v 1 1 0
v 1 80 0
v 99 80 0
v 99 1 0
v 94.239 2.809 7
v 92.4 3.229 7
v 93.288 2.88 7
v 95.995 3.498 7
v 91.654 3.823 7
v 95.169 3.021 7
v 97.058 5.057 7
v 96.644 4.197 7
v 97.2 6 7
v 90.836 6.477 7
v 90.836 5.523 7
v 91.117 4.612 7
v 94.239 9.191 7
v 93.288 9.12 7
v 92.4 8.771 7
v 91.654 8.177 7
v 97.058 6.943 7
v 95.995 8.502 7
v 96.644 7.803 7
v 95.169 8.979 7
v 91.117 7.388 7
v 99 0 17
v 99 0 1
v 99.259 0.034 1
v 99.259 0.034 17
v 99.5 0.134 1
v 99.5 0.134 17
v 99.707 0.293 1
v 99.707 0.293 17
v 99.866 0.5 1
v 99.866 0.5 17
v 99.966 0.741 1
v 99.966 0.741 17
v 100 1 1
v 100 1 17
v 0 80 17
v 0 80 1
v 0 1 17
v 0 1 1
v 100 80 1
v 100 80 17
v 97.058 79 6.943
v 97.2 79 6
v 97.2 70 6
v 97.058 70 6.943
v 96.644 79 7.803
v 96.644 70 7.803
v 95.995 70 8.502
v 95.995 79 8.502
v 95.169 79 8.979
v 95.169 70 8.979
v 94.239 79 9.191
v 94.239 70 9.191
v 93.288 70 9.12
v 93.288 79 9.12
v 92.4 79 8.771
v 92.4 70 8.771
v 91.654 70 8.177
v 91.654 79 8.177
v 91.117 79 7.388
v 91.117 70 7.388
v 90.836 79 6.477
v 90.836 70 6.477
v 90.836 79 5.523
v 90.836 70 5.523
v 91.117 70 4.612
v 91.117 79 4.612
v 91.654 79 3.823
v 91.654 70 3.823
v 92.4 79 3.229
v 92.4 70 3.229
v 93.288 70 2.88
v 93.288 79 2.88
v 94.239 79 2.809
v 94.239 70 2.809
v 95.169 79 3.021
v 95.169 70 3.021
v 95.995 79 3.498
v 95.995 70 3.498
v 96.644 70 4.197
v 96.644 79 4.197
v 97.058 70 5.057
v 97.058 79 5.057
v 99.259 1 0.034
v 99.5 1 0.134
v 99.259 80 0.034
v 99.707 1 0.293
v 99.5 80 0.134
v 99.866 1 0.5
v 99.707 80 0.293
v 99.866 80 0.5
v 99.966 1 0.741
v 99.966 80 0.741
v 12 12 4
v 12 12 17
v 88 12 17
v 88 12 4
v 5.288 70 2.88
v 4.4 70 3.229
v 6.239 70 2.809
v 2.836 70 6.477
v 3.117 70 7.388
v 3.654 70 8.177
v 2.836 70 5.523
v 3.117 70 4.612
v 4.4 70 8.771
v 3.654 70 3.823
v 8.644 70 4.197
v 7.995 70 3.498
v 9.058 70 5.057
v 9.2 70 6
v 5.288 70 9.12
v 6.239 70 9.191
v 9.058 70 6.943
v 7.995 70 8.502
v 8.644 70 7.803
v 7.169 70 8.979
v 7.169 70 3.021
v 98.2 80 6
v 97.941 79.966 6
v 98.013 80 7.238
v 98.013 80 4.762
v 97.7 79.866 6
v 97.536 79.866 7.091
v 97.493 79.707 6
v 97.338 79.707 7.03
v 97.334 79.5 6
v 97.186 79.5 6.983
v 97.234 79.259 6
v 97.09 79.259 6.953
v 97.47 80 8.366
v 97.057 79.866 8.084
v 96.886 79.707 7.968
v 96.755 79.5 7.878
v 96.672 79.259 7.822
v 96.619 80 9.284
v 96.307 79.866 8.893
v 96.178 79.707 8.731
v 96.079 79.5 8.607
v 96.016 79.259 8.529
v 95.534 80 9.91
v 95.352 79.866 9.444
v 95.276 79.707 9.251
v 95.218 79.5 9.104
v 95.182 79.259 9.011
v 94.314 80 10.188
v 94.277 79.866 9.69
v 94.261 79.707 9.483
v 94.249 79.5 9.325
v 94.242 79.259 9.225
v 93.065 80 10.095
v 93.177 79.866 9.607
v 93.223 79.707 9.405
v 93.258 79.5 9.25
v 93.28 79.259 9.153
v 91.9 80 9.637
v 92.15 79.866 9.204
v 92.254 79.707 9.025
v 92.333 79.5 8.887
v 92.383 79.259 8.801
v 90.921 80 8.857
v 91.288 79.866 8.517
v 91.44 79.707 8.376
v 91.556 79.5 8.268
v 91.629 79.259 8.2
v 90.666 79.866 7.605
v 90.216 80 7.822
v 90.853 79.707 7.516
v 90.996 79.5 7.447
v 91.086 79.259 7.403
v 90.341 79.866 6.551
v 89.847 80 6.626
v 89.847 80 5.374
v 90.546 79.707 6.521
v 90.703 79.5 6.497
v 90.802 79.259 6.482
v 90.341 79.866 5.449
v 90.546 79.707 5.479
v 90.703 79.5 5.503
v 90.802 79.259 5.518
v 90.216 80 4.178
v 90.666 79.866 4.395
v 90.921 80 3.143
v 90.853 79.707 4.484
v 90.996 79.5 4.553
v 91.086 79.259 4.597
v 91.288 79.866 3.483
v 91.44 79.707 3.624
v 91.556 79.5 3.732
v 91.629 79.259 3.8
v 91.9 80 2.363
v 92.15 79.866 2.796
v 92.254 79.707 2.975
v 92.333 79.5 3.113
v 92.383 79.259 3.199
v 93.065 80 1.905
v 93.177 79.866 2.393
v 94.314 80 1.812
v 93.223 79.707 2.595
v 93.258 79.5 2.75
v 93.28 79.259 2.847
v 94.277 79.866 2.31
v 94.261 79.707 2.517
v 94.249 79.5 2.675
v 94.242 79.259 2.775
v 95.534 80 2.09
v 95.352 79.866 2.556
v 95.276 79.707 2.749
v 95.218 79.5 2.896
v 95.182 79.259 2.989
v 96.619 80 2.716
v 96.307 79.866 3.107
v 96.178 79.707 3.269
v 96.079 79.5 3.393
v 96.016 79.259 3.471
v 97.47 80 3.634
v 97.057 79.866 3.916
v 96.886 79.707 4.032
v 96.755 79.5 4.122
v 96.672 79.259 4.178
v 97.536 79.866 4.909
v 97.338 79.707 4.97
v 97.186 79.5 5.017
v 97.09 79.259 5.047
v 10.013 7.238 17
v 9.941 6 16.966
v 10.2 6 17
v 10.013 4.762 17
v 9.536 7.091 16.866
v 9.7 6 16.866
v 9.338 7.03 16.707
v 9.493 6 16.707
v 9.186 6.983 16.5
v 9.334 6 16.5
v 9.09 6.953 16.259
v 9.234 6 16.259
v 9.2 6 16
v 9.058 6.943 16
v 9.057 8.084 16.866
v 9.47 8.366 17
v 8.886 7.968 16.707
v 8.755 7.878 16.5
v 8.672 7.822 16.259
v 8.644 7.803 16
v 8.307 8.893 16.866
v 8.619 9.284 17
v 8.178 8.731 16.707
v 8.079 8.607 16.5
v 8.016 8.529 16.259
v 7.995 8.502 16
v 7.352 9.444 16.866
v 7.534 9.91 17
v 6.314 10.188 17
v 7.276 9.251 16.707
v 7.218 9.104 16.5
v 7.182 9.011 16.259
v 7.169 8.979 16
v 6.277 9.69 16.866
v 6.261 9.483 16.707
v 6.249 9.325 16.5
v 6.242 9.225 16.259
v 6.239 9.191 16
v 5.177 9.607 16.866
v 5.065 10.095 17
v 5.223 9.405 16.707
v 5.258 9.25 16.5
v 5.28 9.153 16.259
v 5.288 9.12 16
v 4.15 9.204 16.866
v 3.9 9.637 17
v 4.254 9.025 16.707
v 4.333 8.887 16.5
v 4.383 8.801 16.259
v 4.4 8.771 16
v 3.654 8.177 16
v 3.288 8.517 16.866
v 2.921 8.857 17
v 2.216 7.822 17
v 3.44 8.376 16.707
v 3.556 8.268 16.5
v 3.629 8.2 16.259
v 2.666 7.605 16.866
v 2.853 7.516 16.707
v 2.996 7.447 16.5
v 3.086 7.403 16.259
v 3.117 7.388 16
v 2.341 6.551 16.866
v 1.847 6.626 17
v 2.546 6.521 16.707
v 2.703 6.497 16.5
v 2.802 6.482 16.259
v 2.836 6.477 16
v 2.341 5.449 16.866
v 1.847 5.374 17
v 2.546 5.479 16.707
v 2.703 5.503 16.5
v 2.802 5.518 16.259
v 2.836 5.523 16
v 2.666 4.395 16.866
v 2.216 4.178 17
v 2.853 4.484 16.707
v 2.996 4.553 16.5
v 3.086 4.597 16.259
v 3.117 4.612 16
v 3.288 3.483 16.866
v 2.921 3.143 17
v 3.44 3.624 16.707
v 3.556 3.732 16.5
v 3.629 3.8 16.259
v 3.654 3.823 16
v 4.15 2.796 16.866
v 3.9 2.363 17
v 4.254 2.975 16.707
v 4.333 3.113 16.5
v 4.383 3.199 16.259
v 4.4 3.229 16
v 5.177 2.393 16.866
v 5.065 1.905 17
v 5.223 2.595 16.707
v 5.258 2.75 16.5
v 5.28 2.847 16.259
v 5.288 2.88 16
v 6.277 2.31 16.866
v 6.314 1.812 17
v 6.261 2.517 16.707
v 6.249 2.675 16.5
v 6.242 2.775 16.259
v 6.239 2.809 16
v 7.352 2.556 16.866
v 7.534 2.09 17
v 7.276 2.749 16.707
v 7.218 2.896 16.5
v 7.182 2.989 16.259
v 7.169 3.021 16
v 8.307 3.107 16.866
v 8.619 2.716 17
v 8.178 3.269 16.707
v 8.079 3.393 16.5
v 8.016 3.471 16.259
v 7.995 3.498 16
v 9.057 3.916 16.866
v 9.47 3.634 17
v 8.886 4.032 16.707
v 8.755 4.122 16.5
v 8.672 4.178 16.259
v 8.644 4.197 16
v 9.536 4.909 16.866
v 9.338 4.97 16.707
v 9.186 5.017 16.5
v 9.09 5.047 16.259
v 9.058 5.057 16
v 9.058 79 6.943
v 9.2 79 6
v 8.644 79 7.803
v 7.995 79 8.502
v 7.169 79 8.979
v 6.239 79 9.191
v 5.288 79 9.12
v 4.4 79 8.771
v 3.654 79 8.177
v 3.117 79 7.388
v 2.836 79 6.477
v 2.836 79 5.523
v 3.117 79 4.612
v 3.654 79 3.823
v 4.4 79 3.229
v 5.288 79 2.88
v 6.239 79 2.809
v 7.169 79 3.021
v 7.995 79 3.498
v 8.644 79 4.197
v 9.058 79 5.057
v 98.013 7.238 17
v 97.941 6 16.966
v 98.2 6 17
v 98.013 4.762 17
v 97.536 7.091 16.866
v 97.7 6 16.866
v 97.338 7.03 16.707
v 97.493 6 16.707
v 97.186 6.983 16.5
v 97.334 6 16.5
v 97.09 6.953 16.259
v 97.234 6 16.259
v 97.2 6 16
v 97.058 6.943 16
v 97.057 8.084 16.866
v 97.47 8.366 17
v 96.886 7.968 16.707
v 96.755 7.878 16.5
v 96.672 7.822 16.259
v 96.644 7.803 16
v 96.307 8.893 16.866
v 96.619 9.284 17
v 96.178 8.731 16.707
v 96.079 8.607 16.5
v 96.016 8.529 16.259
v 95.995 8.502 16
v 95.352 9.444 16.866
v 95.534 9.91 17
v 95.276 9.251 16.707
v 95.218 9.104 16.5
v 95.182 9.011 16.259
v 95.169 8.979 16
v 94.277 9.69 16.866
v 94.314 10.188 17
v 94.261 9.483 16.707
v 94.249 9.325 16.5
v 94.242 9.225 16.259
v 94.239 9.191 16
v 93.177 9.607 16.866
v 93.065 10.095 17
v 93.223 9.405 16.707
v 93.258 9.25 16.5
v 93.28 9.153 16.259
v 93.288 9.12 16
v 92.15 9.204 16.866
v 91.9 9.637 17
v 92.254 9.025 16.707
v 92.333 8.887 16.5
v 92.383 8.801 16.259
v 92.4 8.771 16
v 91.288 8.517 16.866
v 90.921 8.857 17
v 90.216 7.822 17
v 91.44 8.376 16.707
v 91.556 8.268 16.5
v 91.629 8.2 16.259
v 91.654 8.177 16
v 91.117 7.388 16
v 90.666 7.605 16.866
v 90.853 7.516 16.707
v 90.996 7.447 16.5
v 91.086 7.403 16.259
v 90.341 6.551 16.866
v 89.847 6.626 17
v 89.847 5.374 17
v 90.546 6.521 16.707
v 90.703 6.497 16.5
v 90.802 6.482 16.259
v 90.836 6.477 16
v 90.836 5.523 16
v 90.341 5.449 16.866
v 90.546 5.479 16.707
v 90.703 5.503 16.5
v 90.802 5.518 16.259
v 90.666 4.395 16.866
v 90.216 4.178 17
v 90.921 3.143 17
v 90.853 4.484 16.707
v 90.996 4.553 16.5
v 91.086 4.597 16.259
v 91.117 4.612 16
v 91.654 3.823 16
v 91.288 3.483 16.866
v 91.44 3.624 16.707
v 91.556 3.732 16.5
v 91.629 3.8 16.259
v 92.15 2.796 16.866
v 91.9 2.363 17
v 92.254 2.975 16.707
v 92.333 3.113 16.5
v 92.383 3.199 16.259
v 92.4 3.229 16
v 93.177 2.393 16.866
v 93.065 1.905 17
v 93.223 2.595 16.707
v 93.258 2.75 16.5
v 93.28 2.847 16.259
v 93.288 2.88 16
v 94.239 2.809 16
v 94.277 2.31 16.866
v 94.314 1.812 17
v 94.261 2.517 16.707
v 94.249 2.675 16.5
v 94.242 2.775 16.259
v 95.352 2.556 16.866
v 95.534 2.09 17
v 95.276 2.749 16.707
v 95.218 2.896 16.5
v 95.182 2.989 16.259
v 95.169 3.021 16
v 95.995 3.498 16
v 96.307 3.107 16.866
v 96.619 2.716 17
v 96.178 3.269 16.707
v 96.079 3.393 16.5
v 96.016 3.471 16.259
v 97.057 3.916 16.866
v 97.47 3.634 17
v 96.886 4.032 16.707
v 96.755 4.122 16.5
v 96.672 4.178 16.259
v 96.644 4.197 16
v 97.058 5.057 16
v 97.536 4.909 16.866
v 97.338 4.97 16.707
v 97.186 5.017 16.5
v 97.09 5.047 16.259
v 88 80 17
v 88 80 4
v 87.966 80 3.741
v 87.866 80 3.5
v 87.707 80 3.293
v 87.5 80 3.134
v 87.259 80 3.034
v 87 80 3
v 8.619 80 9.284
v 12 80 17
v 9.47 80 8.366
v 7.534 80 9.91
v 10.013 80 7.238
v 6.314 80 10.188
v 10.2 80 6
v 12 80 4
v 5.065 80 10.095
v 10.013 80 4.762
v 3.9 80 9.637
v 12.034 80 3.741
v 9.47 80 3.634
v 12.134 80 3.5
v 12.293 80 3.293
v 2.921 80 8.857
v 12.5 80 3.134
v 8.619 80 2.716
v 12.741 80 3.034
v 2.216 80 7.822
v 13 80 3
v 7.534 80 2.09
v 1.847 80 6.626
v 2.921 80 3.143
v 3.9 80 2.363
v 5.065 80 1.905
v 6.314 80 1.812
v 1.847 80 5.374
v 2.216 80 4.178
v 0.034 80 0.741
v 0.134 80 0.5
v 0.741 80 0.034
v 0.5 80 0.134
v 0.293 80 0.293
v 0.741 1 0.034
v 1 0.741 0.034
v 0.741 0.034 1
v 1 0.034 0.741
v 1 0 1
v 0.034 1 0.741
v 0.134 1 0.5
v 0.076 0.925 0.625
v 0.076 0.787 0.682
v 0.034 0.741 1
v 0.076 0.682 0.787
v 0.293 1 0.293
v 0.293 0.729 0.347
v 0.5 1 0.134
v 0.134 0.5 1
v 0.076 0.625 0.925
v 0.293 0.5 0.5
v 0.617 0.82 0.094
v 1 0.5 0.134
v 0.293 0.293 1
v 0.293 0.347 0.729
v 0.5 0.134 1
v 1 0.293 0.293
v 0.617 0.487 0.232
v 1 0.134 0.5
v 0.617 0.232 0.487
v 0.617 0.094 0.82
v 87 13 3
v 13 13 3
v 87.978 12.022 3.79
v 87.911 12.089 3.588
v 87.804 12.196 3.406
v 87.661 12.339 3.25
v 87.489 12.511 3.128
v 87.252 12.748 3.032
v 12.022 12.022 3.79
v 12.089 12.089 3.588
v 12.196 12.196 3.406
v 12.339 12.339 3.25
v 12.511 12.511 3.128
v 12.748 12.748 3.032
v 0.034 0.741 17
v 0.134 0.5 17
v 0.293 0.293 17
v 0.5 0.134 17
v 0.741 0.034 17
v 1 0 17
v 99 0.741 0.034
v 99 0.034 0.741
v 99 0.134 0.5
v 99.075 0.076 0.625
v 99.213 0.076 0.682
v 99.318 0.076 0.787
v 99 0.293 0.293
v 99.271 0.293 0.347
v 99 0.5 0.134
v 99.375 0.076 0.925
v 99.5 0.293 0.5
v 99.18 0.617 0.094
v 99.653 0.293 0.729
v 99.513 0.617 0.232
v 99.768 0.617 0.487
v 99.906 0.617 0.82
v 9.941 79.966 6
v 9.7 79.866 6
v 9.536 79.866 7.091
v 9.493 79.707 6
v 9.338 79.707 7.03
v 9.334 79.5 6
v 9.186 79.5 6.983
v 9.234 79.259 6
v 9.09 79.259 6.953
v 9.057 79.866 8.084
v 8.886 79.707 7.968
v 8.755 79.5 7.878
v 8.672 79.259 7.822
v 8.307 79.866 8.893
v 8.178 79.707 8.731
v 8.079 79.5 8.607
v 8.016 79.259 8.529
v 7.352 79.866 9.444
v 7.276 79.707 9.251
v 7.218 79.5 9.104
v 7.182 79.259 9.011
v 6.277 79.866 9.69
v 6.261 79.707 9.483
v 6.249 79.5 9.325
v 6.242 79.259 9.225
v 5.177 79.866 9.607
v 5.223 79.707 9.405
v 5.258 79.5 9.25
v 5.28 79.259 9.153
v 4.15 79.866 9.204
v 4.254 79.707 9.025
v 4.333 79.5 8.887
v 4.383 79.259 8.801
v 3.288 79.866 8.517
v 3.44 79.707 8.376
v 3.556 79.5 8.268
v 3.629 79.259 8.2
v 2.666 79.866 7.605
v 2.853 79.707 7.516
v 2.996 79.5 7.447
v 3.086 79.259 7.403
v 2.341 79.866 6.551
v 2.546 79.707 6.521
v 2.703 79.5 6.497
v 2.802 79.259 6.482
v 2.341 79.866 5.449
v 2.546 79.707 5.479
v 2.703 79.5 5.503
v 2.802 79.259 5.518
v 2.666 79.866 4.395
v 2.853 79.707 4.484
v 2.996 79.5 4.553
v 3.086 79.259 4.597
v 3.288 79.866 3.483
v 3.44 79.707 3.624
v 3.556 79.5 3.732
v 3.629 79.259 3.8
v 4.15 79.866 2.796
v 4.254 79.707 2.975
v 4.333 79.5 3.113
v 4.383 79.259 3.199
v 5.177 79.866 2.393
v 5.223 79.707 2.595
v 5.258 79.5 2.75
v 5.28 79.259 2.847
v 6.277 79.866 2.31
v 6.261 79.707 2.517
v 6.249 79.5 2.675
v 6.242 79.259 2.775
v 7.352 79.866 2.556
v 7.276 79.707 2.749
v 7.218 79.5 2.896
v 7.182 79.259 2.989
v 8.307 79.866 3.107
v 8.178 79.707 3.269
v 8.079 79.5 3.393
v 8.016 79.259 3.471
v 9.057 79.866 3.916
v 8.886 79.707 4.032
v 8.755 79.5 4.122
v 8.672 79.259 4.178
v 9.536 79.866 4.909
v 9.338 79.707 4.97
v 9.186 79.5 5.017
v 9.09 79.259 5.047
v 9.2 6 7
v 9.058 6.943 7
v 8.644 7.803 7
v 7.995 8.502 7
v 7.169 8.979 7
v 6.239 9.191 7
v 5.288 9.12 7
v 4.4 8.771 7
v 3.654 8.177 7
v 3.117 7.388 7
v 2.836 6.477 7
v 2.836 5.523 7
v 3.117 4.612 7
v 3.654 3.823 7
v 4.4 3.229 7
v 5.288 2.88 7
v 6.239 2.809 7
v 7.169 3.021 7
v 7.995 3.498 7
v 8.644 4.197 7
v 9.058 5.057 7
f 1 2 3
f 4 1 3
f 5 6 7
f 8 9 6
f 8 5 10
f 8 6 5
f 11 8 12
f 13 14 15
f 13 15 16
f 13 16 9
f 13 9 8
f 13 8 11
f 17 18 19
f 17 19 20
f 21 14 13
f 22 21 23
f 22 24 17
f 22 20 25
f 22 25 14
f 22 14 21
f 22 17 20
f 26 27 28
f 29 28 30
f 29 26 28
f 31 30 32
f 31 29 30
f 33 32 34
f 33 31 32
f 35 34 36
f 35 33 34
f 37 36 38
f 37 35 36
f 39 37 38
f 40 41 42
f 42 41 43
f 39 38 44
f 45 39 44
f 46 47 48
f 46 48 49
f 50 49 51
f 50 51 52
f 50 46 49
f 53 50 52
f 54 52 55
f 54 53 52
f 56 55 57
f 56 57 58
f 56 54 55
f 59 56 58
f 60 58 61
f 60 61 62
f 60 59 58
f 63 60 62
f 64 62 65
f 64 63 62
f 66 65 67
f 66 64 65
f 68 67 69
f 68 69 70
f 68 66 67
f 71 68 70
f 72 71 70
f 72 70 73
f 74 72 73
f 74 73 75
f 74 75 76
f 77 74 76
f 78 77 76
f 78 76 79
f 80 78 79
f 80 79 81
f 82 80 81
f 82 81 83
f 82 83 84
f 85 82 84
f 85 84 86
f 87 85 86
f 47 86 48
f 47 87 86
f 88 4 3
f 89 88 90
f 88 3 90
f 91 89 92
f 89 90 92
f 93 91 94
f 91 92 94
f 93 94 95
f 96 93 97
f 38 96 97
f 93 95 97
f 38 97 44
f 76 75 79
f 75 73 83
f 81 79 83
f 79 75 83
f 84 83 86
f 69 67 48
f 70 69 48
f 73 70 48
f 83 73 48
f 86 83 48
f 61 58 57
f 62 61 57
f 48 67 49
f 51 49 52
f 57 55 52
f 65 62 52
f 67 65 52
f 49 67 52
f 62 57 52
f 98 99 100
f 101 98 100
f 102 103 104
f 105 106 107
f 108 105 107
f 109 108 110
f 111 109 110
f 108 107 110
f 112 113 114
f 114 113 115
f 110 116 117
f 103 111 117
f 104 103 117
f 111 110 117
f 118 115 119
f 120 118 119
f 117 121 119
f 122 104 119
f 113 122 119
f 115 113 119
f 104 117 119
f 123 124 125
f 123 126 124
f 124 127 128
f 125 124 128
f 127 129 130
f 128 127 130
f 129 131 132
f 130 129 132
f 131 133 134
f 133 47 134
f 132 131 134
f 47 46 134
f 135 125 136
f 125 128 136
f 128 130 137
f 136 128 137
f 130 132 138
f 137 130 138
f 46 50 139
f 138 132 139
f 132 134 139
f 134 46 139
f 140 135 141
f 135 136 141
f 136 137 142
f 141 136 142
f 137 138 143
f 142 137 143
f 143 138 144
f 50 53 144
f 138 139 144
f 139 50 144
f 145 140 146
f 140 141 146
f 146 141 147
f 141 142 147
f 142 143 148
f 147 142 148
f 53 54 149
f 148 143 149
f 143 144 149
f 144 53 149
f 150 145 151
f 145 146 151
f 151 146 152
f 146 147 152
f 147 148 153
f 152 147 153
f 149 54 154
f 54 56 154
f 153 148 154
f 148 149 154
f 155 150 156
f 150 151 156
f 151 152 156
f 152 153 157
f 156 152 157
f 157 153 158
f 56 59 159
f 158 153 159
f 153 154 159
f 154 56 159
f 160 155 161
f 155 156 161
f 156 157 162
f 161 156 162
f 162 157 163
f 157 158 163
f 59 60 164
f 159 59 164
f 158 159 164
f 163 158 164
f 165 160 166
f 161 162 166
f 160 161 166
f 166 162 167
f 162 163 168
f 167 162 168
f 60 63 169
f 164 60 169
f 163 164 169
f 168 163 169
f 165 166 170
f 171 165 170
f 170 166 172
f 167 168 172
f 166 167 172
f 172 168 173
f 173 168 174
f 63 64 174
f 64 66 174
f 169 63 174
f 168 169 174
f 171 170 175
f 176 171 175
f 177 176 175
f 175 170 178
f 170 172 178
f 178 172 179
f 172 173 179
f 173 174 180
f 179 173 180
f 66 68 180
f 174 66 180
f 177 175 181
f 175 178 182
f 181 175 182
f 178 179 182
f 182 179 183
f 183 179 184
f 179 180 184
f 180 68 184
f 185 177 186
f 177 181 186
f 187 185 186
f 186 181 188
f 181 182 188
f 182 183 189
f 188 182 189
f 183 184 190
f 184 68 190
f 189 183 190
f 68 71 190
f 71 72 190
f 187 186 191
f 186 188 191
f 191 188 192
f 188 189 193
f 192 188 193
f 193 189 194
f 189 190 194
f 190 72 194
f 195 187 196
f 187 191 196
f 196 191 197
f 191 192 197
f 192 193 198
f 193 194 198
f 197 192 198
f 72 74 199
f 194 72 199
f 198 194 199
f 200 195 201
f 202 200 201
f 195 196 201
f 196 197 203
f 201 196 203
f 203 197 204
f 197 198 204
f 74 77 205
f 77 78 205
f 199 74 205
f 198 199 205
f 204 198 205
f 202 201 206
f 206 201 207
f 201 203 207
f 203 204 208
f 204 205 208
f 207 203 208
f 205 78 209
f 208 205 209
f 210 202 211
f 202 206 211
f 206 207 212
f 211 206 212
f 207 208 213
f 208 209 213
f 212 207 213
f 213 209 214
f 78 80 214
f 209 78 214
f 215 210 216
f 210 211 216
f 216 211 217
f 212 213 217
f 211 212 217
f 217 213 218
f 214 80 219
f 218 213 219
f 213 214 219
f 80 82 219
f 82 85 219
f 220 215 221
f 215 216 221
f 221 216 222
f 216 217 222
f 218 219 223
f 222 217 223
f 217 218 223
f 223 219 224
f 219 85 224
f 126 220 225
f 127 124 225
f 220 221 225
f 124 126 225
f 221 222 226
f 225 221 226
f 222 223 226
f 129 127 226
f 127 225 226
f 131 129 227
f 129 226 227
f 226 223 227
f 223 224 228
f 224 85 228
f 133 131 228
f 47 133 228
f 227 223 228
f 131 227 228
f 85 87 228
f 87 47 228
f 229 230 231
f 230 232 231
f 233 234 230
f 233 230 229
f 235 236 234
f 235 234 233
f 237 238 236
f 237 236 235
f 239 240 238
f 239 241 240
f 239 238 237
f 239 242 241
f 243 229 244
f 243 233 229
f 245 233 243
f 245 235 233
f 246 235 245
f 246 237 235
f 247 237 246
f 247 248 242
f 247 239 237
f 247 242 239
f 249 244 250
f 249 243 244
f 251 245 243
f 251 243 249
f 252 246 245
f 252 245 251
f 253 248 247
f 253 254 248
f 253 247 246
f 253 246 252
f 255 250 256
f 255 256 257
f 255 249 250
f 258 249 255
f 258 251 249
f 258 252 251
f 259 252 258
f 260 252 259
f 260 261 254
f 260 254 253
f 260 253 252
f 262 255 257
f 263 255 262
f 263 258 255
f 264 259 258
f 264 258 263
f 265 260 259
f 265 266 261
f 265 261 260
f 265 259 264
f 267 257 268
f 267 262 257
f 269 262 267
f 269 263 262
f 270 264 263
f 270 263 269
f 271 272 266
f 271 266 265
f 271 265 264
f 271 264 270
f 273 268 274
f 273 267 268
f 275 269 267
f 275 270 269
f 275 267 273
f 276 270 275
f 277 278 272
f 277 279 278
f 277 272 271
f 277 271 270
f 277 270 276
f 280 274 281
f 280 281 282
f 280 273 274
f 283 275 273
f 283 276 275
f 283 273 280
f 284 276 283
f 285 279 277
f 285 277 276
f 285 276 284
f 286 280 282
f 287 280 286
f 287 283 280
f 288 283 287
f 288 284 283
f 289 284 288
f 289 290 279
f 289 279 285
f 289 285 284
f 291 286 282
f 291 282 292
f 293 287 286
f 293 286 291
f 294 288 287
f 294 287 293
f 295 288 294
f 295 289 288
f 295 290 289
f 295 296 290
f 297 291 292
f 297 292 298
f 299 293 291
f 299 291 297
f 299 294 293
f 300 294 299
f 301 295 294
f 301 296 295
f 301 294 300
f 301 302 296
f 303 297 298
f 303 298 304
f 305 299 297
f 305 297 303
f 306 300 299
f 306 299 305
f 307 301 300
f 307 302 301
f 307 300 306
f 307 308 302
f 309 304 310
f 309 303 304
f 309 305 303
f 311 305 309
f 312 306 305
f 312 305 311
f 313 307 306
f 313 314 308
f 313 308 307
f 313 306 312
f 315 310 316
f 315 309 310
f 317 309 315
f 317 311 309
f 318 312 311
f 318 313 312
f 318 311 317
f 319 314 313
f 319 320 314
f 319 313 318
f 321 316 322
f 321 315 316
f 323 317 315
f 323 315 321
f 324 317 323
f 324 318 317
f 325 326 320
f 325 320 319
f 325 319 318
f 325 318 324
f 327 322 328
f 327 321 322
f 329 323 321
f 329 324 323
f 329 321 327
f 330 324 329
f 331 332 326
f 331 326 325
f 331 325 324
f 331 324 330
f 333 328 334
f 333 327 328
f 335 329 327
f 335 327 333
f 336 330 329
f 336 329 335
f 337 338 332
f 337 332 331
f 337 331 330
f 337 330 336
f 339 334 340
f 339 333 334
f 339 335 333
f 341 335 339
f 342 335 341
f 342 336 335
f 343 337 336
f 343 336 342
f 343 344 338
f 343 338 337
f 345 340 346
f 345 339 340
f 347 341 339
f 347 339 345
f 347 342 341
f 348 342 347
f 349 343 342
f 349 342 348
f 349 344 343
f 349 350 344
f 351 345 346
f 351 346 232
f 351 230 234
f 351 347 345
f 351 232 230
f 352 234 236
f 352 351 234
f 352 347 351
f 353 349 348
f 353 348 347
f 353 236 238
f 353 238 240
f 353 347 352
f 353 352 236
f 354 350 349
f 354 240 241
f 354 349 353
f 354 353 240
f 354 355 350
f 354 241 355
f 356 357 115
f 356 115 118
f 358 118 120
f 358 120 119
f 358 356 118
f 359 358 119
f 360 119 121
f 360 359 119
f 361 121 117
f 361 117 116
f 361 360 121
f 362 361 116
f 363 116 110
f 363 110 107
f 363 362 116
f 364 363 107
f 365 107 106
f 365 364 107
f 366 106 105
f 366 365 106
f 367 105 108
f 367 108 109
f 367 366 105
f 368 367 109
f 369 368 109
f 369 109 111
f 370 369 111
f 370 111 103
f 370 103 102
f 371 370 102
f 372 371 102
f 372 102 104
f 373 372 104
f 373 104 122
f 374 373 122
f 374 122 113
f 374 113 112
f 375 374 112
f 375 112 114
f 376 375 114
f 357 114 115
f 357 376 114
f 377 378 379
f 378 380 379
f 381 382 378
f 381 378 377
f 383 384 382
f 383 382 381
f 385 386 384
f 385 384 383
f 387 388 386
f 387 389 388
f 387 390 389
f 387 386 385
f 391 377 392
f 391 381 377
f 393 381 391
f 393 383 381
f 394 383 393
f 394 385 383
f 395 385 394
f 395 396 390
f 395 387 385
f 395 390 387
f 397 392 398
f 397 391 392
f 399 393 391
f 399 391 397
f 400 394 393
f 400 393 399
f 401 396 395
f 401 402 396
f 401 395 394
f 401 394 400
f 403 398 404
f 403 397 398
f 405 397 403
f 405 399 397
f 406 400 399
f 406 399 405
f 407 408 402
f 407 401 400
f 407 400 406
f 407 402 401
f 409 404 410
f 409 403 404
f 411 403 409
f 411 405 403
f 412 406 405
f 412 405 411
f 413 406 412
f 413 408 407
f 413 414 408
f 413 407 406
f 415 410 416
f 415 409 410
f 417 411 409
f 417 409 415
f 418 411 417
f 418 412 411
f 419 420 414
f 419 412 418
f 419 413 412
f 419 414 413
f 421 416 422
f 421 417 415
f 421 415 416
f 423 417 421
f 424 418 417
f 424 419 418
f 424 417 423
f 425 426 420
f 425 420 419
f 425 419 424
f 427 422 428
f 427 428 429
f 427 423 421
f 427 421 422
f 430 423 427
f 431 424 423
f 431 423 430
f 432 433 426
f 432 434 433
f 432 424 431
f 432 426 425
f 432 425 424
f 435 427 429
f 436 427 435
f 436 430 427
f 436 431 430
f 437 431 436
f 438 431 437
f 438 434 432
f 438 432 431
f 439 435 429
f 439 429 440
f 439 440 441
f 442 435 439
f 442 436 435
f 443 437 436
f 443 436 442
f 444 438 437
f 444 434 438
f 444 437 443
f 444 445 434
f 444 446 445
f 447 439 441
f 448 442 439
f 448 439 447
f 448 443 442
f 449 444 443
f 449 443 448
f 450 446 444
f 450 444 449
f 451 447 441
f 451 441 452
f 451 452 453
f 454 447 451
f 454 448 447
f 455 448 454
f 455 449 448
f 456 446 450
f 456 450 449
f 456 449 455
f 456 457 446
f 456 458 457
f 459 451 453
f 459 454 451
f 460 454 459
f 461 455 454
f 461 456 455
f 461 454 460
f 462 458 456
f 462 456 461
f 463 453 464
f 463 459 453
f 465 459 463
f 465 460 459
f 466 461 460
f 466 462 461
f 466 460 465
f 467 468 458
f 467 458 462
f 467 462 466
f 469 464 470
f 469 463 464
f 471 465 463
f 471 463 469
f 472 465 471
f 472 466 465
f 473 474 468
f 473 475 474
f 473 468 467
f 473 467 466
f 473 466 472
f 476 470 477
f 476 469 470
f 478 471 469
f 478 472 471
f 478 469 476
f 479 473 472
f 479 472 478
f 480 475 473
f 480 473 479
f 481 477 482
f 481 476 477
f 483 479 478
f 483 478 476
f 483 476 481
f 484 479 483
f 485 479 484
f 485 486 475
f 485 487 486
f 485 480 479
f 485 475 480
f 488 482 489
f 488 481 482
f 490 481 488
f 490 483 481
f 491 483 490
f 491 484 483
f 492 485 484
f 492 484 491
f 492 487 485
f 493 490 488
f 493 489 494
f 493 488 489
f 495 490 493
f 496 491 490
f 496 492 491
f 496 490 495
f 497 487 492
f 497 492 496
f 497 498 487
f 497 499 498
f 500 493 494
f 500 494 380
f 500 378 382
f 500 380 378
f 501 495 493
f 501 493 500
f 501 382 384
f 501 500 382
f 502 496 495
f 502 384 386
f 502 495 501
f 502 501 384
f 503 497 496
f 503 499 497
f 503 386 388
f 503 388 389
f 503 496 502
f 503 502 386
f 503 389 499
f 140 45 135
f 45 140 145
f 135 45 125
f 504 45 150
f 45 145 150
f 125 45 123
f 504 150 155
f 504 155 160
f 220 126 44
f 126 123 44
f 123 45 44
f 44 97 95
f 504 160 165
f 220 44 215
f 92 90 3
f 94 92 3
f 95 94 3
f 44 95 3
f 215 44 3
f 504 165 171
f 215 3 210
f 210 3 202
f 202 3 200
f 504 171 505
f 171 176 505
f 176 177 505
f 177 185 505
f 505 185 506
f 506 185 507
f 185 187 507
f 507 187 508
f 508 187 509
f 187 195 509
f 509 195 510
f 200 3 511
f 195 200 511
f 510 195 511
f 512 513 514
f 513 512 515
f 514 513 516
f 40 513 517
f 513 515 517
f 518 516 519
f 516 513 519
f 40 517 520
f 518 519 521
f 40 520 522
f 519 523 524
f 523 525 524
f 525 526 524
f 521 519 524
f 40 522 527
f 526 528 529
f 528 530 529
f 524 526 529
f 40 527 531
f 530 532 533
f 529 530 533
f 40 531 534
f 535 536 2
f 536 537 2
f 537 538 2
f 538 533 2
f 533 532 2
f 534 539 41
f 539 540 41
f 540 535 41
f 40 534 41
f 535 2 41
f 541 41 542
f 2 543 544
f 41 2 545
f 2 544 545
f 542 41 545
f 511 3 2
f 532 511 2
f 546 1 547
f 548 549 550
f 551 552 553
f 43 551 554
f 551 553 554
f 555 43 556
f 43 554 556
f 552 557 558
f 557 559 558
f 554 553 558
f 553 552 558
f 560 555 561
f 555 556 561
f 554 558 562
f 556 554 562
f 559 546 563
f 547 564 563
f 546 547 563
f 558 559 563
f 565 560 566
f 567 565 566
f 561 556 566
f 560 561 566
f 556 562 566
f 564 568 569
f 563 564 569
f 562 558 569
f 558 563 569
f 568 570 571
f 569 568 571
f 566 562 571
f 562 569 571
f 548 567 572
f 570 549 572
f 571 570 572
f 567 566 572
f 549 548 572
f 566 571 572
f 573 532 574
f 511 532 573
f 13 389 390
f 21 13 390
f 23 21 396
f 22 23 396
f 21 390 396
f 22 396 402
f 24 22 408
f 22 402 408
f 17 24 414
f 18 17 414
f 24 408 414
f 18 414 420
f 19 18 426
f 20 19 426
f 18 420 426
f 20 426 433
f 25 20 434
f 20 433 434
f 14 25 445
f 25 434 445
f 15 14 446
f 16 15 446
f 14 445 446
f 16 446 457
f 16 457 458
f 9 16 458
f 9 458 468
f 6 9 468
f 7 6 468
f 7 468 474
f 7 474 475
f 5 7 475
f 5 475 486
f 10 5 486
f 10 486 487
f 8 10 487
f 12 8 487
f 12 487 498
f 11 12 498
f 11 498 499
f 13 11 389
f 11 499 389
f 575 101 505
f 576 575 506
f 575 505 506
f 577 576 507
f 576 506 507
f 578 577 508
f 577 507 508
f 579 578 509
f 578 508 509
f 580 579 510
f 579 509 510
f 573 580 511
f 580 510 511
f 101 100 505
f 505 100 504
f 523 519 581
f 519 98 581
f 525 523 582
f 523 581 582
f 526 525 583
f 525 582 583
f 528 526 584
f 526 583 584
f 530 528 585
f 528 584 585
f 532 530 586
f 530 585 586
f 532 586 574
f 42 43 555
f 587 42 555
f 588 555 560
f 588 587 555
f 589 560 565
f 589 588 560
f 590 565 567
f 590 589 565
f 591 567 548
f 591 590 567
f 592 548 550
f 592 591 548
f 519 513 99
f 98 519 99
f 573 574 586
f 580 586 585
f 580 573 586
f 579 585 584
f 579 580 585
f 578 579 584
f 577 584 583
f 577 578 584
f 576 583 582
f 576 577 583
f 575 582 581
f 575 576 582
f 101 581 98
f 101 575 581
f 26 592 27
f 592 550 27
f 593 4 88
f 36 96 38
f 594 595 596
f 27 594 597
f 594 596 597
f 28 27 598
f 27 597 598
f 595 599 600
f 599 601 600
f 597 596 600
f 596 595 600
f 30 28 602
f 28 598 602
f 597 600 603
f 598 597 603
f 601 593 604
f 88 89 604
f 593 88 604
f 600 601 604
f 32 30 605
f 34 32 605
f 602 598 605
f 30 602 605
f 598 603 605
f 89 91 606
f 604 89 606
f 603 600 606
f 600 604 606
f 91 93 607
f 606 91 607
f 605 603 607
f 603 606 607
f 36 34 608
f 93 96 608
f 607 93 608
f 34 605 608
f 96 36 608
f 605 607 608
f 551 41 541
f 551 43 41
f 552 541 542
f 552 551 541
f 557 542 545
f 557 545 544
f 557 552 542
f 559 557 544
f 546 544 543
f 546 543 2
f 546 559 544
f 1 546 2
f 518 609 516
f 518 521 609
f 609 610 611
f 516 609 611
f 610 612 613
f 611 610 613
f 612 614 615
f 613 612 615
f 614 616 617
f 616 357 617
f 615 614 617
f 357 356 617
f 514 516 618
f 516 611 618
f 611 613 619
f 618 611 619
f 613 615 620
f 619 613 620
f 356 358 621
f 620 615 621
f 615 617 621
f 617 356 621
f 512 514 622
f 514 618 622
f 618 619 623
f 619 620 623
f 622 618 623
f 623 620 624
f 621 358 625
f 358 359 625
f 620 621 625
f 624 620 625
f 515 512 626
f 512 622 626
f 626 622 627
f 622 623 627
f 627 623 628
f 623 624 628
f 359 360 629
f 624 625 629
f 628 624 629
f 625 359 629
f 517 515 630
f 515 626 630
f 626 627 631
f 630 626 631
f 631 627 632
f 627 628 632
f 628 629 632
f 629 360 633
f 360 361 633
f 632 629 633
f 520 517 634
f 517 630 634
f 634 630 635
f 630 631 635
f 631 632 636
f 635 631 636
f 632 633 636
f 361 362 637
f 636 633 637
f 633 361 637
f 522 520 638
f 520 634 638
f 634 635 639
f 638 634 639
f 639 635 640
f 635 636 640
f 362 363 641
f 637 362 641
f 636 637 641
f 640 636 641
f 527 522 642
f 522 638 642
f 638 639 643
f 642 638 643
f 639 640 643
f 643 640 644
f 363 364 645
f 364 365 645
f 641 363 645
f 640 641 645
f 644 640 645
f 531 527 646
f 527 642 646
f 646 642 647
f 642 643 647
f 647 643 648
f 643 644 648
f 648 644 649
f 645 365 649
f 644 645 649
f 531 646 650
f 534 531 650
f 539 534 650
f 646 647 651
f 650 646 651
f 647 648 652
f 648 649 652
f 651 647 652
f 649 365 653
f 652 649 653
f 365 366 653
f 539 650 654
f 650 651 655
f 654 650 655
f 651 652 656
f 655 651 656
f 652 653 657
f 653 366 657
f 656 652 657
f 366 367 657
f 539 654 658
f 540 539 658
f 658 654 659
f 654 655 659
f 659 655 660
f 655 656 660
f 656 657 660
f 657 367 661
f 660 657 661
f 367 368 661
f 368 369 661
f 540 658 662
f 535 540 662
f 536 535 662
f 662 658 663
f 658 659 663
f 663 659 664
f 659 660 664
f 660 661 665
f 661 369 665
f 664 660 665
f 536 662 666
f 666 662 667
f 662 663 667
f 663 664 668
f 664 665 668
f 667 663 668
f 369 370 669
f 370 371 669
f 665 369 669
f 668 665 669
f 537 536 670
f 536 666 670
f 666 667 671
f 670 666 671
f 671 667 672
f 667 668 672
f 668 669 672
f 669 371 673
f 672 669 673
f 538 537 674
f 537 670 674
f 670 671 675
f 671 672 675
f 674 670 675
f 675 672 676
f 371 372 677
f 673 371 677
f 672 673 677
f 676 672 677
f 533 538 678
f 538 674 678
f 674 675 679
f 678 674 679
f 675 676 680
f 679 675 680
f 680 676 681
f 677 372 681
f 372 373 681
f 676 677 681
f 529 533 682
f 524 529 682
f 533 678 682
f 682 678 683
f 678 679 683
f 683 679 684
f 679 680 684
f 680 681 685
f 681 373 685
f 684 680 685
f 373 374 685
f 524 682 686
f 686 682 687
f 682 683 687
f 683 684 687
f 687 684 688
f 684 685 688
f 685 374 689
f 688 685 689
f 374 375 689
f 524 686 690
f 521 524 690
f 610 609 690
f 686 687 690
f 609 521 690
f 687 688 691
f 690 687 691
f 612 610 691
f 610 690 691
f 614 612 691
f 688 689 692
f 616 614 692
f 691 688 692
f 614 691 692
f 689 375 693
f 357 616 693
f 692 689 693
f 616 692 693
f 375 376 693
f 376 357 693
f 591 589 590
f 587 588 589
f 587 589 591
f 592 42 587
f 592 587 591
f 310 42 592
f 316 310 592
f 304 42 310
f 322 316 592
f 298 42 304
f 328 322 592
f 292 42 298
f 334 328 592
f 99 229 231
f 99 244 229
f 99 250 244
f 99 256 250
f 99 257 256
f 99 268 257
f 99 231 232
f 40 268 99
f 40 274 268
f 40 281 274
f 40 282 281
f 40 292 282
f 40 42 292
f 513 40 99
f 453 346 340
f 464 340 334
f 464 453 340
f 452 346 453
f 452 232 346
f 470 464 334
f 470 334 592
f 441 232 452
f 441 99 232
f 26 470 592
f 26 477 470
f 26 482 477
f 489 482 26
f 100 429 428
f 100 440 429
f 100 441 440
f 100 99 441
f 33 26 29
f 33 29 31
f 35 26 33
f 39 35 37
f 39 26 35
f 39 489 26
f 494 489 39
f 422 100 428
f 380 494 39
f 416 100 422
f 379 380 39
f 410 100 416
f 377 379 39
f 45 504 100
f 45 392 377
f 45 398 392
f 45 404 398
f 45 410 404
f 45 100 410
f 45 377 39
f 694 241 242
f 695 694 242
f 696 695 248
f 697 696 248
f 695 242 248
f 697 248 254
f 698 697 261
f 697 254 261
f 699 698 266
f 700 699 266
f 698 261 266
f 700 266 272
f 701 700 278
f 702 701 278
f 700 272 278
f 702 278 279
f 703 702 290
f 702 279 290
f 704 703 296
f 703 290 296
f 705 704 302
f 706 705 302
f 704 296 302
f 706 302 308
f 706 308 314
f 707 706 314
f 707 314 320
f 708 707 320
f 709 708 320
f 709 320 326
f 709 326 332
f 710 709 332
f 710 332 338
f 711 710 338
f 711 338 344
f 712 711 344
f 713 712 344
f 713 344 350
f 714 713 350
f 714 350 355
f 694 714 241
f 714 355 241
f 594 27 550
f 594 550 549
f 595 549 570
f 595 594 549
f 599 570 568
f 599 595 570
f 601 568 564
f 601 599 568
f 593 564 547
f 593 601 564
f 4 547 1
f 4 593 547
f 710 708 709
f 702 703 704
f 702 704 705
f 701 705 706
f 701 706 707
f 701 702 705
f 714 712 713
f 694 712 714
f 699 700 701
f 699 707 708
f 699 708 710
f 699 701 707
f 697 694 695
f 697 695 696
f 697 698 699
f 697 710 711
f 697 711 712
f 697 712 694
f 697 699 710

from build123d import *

# Parameters (mm, degrees)
F1_DEPTH = 17
F4_DEPTH = 14
F3_R     = 3.2
F5_DEPTH = 10
F7_R     = 3.2
F8_DEPTH = 10
F9_R     = 1


with BuildPart() as f1:
    # F0 (on Top) → F1 (new body)
    with BuildSketch(Plane.XY):
        Polygon((0, 80), (0, 0), (50, 0), (100, 0), (100, 80), (50, 80), align=None)
    extrude(amount=F1_DEPTH)

    # F3 (on offset) → F4 (cut)
    with BuildSketch(Plane.XY.offset(17)):
        Polygon((50, 80), (12, 80), (12, 12), (50, 12), (88, 12), (88, 80), align=None)
    extrude(amount=-F4_DEPTH, mode=Mode.SUBTRACT)

    # F3 (on offset) → F5 (cut)
    with BuildSketch(Plane.XY.offset(17)):
        with Locations((6, 6)):
            Circle(F3_R)
        with Locations((94, 6)):
            Circle(F3_R)
    extrude(amount=-F5_DEPTH, mode=Mode.SUBTRACT)

    # F7 (on offset) → F8 (cut)
    with BuildSketch(Plane.XZ.offset(-80)):
        with Locations((94, 6)):
            Circle(F7_R)
        with Locations((6, 6)):
            Circle(F7_R)
    extrude(amount=F8_DEPTH, mode=Mode.SUBTRACT)

    # F9
    f9_edges = [f1.edges().sort_by_distance(p)[0] for p in [
        (12, 46, 3),
        (88, 46, 3),
        (50, 12, 3),
        (90.8, 6, 17),
        (2.8, 6, 17),
        (90.8, 80, 6),
        (2.8, 80, 6),
        (100, 40, 0),
        (50, 0, 0),
        (0, 40, 0),
        (100, 0, 8.5),
        (0, 0, 8.5),
    ]]
    fillet(f9_edges, radius=F9_R)


solid = f1.part
